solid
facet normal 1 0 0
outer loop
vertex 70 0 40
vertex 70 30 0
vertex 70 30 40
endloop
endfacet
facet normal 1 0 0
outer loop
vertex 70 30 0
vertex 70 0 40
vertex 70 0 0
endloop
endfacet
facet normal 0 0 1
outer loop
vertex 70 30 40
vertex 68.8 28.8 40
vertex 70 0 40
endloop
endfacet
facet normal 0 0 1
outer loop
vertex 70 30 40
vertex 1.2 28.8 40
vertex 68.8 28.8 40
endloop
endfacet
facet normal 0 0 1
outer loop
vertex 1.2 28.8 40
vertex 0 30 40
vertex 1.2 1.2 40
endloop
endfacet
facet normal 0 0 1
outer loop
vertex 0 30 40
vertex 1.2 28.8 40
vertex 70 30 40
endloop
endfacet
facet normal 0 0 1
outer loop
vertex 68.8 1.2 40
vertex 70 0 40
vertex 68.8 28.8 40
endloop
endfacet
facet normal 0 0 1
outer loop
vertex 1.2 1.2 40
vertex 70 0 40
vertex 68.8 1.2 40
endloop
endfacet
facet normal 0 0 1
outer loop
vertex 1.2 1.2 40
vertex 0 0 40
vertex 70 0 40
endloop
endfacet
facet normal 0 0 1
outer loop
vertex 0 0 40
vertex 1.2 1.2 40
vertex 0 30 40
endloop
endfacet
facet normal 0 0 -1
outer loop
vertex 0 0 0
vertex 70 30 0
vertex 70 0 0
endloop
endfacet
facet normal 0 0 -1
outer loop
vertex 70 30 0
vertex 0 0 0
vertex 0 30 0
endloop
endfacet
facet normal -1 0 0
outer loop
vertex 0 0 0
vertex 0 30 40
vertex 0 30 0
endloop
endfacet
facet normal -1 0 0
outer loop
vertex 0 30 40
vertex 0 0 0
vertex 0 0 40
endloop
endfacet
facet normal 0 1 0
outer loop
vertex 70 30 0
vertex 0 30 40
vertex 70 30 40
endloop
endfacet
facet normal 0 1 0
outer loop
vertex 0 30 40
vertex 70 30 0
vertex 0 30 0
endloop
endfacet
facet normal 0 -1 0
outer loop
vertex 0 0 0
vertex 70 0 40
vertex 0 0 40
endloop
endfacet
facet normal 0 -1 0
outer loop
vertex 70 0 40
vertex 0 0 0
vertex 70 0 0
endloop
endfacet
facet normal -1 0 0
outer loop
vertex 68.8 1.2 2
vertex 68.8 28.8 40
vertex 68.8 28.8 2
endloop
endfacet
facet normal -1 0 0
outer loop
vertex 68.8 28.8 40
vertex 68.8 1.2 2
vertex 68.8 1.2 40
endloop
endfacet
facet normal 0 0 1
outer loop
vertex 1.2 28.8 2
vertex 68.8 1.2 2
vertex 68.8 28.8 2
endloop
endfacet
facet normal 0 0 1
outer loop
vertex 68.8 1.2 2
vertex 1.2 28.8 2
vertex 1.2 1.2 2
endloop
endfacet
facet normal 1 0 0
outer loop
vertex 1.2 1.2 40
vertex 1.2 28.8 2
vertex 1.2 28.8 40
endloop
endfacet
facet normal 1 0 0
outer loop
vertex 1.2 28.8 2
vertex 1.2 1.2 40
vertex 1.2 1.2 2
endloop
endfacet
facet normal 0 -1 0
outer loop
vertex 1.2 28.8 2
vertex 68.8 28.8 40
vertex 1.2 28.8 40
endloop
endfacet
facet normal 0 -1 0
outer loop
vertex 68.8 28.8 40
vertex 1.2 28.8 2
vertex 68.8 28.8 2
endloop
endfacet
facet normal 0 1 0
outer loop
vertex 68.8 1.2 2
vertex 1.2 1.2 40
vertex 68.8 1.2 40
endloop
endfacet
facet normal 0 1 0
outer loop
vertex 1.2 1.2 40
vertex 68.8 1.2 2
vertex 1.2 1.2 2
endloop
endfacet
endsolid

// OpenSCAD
$fn = 32;

// ----------------------------------------------------------------------
// Open box: 1.2 mm walls
// ----------------------------------------------------------------------

// --- parameters (mm) ---
box_l = 70;               // outer length, X
box_w = 30;               // outer width, Y
box_h = 40;               // outer height, Z
wall = 1.2;               // wall thickness
floor = 2;                // floor thickness
fit_tol = 0.1;            // tolerance for press fits, mm
free_tol = 0.3;           // tolerance for clearance fits, mm

difference() {
  cube([box_l, box_w, box_h]);
  translate([wall, wall, floor])
    cube([box_l - 2 * wall, box_w - 2 * wall, box_h]);
}
